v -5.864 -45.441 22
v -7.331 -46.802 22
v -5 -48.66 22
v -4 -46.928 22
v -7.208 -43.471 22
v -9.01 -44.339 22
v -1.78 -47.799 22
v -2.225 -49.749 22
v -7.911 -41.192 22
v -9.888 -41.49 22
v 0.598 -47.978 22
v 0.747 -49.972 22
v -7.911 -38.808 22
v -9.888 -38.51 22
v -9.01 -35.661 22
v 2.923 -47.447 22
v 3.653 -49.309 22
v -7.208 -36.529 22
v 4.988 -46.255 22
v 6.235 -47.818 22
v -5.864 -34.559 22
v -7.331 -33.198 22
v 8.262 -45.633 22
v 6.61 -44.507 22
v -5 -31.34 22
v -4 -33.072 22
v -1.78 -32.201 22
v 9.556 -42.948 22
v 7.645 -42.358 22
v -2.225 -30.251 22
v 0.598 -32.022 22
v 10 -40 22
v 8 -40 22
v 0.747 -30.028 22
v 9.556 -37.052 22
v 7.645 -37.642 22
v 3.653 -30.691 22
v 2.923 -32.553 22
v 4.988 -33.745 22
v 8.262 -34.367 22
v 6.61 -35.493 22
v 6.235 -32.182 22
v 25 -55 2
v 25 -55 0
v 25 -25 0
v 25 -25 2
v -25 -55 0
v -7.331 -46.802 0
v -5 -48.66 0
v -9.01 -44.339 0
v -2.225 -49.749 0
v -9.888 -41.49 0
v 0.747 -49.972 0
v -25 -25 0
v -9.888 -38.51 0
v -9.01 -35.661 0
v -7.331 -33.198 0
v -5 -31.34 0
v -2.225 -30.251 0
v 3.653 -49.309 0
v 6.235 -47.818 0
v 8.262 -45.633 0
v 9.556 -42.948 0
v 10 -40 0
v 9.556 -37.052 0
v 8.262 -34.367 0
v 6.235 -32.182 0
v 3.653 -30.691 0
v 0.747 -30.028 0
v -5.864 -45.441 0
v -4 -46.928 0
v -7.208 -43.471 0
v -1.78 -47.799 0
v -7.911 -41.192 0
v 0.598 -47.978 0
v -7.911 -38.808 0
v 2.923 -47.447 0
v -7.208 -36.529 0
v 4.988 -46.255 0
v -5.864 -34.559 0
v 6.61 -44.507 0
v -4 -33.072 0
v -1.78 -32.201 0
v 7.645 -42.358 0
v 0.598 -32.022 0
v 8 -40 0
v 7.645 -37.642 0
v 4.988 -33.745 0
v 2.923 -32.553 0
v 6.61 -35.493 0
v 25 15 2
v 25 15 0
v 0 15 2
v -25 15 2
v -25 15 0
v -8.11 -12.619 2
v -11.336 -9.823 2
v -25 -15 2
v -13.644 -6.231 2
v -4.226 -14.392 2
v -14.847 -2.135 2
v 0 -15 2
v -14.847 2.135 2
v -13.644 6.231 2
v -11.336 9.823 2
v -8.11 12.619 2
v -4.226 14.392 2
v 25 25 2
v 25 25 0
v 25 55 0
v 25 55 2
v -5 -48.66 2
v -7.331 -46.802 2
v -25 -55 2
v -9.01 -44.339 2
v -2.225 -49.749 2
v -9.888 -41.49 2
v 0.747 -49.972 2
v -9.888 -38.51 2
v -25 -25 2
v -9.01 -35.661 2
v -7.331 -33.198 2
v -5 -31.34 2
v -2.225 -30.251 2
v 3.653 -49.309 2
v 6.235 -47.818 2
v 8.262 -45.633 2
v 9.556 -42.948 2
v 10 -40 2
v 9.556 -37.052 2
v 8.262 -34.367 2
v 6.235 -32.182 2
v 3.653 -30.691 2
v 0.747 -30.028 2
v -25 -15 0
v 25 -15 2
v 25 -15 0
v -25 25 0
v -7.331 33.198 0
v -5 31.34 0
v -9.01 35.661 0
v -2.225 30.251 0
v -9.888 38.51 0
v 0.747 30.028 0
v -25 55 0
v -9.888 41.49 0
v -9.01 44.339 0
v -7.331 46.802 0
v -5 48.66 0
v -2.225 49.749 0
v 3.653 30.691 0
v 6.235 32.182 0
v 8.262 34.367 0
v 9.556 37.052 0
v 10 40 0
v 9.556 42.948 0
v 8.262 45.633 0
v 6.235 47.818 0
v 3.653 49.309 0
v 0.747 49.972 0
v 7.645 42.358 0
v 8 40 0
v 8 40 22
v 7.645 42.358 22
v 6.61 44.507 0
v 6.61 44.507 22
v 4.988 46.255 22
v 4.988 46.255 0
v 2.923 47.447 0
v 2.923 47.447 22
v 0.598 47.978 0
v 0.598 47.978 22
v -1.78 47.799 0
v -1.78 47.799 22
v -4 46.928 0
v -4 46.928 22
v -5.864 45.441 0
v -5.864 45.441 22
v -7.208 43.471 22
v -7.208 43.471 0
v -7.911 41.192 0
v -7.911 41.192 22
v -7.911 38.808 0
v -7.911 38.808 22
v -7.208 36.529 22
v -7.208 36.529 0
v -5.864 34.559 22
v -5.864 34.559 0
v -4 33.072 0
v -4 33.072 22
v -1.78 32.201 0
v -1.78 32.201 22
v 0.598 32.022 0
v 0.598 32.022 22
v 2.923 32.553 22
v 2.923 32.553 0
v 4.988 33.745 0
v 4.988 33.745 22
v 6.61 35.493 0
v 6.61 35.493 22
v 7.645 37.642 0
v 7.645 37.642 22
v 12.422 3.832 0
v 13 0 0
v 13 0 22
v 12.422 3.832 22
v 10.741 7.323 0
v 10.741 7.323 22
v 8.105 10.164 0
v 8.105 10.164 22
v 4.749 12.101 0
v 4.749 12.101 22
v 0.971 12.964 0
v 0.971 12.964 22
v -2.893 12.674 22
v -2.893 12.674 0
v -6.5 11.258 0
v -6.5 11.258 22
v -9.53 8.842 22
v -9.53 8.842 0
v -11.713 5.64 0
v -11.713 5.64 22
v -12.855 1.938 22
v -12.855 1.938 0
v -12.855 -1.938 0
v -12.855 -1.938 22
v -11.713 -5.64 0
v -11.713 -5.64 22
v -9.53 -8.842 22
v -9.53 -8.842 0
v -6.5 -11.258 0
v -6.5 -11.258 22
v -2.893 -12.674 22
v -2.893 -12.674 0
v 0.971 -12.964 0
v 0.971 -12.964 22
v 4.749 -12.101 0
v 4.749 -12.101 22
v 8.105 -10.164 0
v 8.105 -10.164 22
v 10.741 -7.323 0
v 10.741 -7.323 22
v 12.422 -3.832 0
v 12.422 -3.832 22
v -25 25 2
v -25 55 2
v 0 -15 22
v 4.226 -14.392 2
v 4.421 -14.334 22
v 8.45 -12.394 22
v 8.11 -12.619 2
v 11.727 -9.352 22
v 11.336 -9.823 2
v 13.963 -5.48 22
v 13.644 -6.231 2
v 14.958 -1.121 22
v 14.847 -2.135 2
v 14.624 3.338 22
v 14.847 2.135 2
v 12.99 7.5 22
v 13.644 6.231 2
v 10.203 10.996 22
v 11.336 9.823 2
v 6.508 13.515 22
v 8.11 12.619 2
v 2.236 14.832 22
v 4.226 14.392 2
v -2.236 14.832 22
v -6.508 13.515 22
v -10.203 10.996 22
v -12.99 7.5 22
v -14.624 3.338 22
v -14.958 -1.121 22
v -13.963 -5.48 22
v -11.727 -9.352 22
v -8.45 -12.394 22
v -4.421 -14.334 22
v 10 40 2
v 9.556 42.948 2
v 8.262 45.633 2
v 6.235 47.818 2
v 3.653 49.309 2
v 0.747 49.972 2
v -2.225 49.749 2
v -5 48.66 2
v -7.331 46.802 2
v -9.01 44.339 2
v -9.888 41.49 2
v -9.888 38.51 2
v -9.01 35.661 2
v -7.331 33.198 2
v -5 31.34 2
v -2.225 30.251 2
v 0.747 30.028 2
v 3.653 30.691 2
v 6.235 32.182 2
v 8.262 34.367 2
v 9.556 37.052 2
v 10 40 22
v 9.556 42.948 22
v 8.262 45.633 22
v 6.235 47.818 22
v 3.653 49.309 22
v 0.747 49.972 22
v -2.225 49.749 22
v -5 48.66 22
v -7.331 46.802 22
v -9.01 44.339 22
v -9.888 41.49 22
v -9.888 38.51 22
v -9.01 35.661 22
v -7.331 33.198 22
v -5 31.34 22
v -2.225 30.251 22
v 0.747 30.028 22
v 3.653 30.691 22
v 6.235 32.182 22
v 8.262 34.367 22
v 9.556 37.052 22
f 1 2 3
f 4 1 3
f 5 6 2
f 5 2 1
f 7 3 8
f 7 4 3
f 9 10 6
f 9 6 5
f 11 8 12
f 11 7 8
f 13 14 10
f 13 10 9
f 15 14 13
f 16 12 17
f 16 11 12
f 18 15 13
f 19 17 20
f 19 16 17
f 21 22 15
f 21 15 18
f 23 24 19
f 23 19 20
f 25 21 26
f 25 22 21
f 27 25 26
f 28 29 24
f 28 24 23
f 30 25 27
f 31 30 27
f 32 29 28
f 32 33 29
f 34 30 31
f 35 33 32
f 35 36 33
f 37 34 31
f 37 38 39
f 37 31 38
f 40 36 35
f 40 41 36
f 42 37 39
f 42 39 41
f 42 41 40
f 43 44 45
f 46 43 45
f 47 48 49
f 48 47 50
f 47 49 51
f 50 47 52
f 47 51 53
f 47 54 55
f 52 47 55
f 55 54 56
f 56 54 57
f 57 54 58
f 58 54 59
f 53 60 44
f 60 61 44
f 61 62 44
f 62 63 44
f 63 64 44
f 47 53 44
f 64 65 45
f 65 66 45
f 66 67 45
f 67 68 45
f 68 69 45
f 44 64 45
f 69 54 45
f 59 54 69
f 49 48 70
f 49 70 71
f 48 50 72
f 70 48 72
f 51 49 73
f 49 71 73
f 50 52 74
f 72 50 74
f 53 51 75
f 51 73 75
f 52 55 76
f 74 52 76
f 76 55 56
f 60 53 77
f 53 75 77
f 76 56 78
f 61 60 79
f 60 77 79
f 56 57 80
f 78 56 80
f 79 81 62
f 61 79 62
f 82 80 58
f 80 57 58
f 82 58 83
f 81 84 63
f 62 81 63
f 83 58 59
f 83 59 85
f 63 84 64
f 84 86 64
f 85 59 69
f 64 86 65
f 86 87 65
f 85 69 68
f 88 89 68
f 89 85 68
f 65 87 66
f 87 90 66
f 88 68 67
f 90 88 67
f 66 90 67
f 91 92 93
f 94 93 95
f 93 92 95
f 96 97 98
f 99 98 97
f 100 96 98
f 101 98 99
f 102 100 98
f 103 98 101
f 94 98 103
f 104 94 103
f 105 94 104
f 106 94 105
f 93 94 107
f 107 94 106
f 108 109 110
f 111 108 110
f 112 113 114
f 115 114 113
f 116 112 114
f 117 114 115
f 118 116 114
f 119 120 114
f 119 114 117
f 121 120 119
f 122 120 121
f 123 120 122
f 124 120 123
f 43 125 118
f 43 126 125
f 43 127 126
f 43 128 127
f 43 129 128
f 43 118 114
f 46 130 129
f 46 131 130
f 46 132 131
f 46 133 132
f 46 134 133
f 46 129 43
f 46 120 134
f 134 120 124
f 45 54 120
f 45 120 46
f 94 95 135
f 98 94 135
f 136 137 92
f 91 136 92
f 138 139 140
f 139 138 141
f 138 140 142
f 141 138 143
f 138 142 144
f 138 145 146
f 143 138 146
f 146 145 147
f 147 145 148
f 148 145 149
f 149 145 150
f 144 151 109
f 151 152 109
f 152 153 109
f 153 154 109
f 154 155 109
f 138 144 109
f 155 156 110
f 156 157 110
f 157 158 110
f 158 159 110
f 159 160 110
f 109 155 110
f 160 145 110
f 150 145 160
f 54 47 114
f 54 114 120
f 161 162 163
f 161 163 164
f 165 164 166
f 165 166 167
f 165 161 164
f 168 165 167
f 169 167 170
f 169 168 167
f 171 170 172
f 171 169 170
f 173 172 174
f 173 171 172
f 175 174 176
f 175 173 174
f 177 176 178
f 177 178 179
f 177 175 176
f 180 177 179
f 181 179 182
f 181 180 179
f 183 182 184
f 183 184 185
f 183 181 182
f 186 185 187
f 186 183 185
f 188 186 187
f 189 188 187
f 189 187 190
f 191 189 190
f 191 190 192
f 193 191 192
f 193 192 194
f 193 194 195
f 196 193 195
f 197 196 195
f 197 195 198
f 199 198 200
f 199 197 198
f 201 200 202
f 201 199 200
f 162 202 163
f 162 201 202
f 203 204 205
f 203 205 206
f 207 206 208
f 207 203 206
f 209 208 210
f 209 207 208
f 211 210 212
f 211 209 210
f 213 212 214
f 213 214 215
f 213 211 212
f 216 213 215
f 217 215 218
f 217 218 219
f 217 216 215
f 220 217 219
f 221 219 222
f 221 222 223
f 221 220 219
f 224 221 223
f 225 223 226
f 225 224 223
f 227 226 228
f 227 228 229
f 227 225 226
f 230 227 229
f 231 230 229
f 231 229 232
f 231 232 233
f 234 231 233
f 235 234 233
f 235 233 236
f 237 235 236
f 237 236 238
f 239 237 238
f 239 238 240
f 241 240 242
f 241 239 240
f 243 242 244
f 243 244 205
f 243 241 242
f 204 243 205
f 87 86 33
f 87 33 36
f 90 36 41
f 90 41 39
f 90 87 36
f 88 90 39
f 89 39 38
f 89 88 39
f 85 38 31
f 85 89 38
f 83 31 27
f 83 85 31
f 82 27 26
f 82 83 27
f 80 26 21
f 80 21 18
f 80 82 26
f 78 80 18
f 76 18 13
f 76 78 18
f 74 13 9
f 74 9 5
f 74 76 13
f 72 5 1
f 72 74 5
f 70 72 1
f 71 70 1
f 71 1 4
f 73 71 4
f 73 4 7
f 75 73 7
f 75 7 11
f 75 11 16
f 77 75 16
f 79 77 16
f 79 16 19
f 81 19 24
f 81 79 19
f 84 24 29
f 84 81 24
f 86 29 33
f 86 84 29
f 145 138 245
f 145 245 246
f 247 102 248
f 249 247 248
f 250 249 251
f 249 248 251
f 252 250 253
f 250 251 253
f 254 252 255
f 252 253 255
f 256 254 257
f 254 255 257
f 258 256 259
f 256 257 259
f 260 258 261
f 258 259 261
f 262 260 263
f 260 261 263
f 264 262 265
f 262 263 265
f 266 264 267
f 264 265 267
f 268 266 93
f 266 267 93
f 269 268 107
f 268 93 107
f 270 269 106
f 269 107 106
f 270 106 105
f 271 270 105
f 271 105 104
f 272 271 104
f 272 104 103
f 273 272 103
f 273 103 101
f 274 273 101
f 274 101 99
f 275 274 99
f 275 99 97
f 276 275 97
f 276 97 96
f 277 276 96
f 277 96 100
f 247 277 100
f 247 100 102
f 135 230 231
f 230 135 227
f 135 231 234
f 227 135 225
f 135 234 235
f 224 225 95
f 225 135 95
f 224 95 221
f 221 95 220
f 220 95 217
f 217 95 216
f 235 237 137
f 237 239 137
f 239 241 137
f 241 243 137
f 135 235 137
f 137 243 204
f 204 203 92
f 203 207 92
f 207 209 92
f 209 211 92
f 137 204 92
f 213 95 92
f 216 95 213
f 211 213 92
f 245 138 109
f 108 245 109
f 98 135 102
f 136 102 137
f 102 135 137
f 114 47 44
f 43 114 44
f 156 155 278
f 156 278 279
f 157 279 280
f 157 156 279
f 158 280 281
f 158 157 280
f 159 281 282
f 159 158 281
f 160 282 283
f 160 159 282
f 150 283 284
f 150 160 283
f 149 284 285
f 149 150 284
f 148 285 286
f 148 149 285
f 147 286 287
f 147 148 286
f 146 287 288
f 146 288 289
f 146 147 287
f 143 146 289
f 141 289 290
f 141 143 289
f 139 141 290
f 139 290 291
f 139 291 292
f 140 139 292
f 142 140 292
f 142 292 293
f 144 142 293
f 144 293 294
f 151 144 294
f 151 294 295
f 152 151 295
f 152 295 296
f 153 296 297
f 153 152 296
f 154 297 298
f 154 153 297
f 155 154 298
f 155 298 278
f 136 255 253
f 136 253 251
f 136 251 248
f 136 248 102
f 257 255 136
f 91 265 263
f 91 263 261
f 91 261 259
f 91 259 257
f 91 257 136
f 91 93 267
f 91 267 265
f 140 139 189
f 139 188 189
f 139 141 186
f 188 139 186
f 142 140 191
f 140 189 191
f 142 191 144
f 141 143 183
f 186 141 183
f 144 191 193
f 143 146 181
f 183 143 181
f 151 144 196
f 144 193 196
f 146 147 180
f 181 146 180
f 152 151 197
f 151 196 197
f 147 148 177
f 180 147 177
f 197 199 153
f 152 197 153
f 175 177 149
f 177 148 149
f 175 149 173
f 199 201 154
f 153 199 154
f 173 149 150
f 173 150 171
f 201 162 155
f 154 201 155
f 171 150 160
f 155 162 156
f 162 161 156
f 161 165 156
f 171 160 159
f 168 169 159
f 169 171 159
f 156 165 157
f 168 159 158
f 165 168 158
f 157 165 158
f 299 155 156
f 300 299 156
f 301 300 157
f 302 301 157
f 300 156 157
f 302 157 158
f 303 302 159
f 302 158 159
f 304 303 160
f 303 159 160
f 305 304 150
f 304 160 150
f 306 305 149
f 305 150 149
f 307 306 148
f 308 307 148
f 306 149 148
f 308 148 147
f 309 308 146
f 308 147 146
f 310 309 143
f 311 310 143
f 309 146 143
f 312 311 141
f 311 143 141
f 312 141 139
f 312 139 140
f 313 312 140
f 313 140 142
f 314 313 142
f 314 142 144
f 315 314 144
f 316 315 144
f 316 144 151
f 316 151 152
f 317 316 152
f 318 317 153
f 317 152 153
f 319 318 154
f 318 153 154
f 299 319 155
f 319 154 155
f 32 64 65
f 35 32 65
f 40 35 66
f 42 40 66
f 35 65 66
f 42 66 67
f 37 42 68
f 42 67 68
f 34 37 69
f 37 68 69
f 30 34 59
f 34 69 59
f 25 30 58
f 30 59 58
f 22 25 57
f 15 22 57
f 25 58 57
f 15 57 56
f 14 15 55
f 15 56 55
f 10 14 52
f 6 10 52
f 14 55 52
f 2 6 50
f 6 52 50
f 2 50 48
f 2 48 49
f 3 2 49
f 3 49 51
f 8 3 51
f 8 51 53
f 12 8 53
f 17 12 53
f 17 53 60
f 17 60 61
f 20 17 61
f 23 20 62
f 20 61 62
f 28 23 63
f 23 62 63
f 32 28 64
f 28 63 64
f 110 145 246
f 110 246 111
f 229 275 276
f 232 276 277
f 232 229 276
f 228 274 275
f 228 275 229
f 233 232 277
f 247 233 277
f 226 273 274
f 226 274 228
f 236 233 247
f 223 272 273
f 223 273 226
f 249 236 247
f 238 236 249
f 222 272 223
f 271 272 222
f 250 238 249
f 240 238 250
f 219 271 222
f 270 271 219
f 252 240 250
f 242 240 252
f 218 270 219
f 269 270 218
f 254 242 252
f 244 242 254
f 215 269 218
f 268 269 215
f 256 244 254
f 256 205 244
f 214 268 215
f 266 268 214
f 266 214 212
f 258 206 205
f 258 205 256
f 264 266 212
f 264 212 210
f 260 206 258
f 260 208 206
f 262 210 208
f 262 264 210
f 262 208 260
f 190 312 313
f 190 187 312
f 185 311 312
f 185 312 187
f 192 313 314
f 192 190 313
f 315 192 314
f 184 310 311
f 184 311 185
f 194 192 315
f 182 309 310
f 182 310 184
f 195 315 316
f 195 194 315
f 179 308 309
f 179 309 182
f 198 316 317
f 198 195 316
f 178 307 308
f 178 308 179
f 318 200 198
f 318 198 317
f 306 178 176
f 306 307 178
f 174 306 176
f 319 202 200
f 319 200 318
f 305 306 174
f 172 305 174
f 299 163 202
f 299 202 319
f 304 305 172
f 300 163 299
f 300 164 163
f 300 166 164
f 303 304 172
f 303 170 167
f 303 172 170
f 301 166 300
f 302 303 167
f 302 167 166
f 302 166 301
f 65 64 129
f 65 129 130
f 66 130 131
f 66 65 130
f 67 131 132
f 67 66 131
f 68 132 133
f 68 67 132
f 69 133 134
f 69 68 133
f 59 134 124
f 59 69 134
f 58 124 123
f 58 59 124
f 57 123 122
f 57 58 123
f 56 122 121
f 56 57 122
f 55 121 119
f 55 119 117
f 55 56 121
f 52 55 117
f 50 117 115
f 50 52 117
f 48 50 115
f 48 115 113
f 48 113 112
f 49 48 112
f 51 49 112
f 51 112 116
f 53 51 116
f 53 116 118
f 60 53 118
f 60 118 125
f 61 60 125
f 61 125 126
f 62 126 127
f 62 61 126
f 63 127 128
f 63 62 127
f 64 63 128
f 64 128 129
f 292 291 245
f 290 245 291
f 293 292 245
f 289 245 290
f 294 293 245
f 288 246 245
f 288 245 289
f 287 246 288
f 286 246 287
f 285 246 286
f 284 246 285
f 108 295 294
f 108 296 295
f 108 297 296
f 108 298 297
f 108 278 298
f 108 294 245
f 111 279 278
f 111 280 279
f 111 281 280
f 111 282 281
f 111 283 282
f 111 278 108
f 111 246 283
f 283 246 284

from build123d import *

# Parameters (mm, degrees)
F1_DEPTH = 2
F0_W     = 50
F0_H     = 30
F0_R     = 10
F0_R_2   = 13
F2_DEPTH = 22
F0_R_3   = 8


with BuildPart() as f1:
    # F0 (on Top) → F1 (new body)
    with BuildSketch(Plane.XY):
        with BuildLine():
            Line((0, 15), (-25, 15))
            Line((-25, 15), (-25, -15))
            Line((-25, -15), (3.27e-08, -15))
            ThreePointArc((3.27e-08, -15), (-15, -1.63e-08), (0, 15))
        make_face()
    extrude(amount=F1_DEPTH)



with BuildPart() as f1b:
    # F0 (on Top) → F1, piece 2 (new body)
    with BuildSketch(Plane.XY):
        with BuildLine():
            Line((25, 15), (0, 15))
            ThreePointArc((0, 15), (10.6066017178, 10.6066017178), (15, 0))
            ThreePointArc((15, 0), (10.6066017294, -10.6066017062), (3.27e-08, -15))
            Line((3.27e-08, -15), (25, -15))
            Line((25, -15), (25, 15))
        make_face()
    extrude(amount=F1_DEPTH)


with BuildPart() as f1c:
    # F0 (on Top) → F1, piece 3 (new body)
    with BuildSketch(Plane.XY):
        with Locations((0, 40)):
            Rectangle(F0_W, F0_H)
        with Locations((0, 40)):
            Circle(F0_R, mode=Mode.SUBTRACT)
    extrude(amount=F1_DEPTH)


with BuildPart() as f1d:
    # F0 (on Top) → F1, piece 4 (new body)
    with BuildSketch(Plane.XY):
        with Locations((0, -40)):
            Rectangle(F0_W, F0_H)
        with Locations((0, -40)):
            Circle(F0_R, mode=Mode.SUBTRACT)
    extrude(amount=F1_DEPTH)


with BuildPart() as f1_1:
    add(f1.part)

    add(f1b.part)  # F2 merges F1b
    # F0 (on Top) → F2 (join)
    with BuildSketch(Plane.XY):
        with BuildLine():
            ThreePointArc((15, 0), (10.6066017178, 10.6066017178), (0, 15))
            ThreePointArc((0, 15), (-15, -1.63e-08), (3.27e-08, -15))
            ThreePointArc((3.27e-08, -15), (10.6066017294, -10.6066017062), (15, 0))
        make_face()
        Circle(F0_R_2, mode=Mode.SUBTRACT)
    extrude(amount=F2_DEPTH)


with BuildPart() as f2:
    # F0 (on Top) → F2, piece 2 (new body)
    with BuildSketch(Plane.XY):
        with Locations((0, 40)):
            Circle(F0_R)
        with Locations((0, 40)):
            Circle(F0_R_3, mode=Mode.SUBTRACT)
    extrude(amount=F2_DEPTH)


with BuildPart() as f2b:
    # F0 (on Top) → F2, piece 3 (new body)
    with BuildSketch(Plane.XY):
        with Locations((0, -40)):
            Circle(F0_R)
        with Locations((0, -40)):
            Circle(F0_R_3, mode=Mode.SUBTRACT)
    extrude(amount=F2_DEPTH)


solid = Compound([f1c.part, f1d.part, f1_1.part, f2.part, f2b.part])
